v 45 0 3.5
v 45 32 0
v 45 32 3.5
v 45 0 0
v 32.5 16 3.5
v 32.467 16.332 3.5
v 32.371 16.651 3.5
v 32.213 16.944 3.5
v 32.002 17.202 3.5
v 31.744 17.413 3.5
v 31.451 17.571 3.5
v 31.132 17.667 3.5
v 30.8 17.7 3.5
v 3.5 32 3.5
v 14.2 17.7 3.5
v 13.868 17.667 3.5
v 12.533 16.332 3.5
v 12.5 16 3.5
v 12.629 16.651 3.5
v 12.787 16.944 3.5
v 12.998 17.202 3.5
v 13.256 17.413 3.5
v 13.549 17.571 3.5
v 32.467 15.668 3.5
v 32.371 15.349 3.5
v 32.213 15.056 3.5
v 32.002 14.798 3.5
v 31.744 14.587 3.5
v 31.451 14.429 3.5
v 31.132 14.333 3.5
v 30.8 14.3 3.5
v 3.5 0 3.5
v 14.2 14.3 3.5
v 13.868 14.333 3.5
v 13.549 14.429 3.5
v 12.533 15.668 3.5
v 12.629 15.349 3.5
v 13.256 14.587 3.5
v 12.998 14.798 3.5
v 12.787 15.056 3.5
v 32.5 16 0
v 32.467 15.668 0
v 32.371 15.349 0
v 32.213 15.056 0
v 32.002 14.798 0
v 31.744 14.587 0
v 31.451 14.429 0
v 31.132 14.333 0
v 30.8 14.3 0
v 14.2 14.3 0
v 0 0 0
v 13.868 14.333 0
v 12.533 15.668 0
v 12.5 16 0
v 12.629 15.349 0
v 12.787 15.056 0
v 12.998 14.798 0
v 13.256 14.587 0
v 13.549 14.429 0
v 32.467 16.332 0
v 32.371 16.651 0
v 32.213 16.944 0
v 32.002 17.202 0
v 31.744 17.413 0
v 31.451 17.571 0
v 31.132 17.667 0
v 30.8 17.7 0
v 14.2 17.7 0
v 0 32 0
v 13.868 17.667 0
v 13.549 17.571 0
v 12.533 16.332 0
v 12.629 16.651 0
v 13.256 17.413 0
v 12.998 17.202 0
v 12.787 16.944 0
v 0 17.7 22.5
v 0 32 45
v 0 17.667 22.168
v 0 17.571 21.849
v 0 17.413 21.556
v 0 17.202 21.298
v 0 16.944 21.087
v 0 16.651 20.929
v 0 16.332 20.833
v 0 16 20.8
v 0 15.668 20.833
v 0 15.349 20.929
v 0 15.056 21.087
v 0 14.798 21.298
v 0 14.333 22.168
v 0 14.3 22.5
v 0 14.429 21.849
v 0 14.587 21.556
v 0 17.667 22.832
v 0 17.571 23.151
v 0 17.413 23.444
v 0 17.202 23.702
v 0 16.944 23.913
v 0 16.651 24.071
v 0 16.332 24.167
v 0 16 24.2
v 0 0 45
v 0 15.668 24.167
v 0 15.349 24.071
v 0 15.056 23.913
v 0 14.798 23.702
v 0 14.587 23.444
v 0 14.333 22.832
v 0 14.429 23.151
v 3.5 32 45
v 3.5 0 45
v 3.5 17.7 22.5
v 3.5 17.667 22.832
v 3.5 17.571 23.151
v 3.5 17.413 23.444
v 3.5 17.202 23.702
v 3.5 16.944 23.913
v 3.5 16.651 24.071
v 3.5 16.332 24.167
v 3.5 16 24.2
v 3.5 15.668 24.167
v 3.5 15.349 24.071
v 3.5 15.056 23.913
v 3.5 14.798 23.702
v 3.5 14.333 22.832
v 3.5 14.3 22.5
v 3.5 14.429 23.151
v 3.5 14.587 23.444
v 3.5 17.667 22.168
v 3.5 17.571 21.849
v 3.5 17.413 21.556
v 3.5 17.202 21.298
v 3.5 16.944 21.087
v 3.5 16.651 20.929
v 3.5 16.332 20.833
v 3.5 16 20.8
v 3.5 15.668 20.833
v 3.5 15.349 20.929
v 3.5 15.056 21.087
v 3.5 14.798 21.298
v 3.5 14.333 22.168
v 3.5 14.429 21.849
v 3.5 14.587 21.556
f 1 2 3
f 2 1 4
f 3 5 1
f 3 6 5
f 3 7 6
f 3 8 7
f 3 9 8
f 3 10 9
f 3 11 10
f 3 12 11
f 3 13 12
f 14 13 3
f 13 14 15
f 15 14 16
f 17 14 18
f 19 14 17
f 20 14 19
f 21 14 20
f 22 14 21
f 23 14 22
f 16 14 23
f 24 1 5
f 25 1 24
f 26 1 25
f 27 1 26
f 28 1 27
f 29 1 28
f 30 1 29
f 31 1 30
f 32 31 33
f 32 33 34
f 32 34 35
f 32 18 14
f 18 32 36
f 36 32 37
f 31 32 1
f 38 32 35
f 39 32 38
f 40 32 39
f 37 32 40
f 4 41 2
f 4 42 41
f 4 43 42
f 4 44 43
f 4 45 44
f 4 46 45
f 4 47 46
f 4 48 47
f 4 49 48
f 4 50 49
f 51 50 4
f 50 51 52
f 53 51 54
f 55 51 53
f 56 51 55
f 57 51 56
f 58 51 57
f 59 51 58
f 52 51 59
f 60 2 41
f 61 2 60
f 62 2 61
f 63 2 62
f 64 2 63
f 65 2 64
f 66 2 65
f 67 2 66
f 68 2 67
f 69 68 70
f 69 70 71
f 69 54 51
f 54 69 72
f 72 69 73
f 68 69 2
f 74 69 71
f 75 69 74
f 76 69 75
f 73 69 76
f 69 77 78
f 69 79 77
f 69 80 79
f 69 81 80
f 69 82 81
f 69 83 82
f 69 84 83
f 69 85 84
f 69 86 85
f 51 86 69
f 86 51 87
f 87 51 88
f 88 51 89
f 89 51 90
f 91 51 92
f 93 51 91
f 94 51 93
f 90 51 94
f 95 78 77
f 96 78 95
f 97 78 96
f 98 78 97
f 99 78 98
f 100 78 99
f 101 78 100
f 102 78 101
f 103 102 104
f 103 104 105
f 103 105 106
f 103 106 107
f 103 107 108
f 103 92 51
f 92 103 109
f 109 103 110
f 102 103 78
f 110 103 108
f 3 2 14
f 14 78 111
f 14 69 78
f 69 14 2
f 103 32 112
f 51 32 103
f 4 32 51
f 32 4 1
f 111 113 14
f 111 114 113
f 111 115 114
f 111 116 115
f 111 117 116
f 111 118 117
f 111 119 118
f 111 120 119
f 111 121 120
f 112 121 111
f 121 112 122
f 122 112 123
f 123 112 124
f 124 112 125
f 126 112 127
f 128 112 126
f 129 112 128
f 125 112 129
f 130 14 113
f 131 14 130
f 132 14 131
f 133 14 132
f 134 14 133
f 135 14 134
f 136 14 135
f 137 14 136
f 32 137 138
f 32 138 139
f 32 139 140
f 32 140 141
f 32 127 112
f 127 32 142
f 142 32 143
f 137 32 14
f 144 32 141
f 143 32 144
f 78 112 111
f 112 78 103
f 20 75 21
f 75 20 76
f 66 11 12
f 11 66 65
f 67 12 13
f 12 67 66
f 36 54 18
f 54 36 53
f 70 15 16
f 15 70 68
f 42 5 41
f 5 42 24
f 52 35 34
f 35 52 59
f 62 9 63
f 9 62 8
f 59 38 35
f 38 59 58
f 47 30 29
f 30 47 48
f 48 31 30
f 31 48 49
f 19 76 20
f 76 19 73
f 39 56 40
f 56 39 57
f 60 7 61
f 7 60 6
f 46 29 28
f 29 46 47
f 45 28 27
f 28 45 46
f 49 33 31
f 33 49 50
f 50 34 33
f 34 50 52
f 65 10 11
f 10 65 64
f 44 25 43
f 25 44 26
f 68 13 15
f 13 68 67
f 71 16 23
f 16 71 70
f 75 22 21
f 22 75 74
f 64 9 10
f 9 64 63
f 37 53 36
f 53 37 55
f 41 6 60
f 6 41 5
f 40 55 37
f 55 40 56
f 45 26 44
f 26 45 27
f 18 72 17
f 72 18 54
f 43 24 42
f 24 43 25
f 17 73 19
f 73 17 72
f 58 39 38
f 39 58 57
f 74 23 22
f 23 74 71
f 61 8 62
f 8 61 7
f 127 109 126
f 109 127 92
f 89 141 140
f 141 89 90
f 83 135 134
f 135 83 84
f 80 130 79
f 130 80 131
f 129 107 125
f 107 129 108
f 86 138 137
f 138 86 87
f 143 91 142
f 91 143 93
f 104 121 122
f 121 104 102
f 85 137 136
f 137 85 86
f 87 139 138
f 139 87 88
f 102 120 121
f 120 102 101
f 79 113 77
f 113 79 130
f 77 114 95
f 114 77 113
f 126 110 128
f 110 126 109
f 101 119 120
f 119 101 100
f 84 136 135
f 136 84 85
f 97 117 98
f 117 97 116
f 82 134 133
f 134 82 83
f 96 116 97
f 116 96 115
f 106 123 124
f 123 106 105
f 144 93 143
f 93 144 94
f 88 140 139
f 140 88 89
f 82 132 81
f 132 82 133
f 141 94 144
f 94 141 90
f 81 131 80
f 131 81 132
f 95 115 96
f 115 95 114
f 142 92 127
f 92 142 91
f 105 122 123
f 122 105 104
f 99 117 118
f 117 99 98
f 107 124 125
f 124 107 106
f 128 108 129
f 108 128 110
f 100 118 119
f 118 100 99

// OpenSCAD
$fn = 32;

// ----------------------------------------------------------------------
// L-bracket: 45 x 32 x 45 mm
// ----------------------------------------------------------------------

// --- parameters (mm) ---
base_len = 45;            // horizontal leg, X
upright_h = 45;           // vertical leg, Z
flange_w = 32;            // bracket depth, Y
mat_t = 3.5;              // plate thickness
hole_d = 3.4;             // clearance for M3
slot_l = 20;              // adjustment slot length

module hole_z(px, py) {
  translate([px, py, -2.5]) cylinder(h = mat_t + 5, d = hole_d);
}
module hole_x(pz, py) {
  translate([-2.5, py, pz]) rotate([0, 90, 0]) cylinder(h = mat_t + 5, d = hole_d);
}
module adjust_slot(px, py) {
  hull() {
    translate([px - (slot_l - hole_d) / 2, py, -2.5]) cylinder(h = mat_t + 5, d = hole_d);
    translate([px + (slot_l - hole_d) / 2, py, -2.5]) cylinder(h = mat_t + 5, d = hole_d);
  }
}

difference() {
  union() {
    /* horizontal leg */
    cube([base_len, flange_w, mat_t]);
    /* vertical leg, overlapping the corner block */
    cube([mat_t, flange_w, upright_h]);
  }
  adjust_slot(22.5, 16);
  hole_x(22.5, 16);
}
